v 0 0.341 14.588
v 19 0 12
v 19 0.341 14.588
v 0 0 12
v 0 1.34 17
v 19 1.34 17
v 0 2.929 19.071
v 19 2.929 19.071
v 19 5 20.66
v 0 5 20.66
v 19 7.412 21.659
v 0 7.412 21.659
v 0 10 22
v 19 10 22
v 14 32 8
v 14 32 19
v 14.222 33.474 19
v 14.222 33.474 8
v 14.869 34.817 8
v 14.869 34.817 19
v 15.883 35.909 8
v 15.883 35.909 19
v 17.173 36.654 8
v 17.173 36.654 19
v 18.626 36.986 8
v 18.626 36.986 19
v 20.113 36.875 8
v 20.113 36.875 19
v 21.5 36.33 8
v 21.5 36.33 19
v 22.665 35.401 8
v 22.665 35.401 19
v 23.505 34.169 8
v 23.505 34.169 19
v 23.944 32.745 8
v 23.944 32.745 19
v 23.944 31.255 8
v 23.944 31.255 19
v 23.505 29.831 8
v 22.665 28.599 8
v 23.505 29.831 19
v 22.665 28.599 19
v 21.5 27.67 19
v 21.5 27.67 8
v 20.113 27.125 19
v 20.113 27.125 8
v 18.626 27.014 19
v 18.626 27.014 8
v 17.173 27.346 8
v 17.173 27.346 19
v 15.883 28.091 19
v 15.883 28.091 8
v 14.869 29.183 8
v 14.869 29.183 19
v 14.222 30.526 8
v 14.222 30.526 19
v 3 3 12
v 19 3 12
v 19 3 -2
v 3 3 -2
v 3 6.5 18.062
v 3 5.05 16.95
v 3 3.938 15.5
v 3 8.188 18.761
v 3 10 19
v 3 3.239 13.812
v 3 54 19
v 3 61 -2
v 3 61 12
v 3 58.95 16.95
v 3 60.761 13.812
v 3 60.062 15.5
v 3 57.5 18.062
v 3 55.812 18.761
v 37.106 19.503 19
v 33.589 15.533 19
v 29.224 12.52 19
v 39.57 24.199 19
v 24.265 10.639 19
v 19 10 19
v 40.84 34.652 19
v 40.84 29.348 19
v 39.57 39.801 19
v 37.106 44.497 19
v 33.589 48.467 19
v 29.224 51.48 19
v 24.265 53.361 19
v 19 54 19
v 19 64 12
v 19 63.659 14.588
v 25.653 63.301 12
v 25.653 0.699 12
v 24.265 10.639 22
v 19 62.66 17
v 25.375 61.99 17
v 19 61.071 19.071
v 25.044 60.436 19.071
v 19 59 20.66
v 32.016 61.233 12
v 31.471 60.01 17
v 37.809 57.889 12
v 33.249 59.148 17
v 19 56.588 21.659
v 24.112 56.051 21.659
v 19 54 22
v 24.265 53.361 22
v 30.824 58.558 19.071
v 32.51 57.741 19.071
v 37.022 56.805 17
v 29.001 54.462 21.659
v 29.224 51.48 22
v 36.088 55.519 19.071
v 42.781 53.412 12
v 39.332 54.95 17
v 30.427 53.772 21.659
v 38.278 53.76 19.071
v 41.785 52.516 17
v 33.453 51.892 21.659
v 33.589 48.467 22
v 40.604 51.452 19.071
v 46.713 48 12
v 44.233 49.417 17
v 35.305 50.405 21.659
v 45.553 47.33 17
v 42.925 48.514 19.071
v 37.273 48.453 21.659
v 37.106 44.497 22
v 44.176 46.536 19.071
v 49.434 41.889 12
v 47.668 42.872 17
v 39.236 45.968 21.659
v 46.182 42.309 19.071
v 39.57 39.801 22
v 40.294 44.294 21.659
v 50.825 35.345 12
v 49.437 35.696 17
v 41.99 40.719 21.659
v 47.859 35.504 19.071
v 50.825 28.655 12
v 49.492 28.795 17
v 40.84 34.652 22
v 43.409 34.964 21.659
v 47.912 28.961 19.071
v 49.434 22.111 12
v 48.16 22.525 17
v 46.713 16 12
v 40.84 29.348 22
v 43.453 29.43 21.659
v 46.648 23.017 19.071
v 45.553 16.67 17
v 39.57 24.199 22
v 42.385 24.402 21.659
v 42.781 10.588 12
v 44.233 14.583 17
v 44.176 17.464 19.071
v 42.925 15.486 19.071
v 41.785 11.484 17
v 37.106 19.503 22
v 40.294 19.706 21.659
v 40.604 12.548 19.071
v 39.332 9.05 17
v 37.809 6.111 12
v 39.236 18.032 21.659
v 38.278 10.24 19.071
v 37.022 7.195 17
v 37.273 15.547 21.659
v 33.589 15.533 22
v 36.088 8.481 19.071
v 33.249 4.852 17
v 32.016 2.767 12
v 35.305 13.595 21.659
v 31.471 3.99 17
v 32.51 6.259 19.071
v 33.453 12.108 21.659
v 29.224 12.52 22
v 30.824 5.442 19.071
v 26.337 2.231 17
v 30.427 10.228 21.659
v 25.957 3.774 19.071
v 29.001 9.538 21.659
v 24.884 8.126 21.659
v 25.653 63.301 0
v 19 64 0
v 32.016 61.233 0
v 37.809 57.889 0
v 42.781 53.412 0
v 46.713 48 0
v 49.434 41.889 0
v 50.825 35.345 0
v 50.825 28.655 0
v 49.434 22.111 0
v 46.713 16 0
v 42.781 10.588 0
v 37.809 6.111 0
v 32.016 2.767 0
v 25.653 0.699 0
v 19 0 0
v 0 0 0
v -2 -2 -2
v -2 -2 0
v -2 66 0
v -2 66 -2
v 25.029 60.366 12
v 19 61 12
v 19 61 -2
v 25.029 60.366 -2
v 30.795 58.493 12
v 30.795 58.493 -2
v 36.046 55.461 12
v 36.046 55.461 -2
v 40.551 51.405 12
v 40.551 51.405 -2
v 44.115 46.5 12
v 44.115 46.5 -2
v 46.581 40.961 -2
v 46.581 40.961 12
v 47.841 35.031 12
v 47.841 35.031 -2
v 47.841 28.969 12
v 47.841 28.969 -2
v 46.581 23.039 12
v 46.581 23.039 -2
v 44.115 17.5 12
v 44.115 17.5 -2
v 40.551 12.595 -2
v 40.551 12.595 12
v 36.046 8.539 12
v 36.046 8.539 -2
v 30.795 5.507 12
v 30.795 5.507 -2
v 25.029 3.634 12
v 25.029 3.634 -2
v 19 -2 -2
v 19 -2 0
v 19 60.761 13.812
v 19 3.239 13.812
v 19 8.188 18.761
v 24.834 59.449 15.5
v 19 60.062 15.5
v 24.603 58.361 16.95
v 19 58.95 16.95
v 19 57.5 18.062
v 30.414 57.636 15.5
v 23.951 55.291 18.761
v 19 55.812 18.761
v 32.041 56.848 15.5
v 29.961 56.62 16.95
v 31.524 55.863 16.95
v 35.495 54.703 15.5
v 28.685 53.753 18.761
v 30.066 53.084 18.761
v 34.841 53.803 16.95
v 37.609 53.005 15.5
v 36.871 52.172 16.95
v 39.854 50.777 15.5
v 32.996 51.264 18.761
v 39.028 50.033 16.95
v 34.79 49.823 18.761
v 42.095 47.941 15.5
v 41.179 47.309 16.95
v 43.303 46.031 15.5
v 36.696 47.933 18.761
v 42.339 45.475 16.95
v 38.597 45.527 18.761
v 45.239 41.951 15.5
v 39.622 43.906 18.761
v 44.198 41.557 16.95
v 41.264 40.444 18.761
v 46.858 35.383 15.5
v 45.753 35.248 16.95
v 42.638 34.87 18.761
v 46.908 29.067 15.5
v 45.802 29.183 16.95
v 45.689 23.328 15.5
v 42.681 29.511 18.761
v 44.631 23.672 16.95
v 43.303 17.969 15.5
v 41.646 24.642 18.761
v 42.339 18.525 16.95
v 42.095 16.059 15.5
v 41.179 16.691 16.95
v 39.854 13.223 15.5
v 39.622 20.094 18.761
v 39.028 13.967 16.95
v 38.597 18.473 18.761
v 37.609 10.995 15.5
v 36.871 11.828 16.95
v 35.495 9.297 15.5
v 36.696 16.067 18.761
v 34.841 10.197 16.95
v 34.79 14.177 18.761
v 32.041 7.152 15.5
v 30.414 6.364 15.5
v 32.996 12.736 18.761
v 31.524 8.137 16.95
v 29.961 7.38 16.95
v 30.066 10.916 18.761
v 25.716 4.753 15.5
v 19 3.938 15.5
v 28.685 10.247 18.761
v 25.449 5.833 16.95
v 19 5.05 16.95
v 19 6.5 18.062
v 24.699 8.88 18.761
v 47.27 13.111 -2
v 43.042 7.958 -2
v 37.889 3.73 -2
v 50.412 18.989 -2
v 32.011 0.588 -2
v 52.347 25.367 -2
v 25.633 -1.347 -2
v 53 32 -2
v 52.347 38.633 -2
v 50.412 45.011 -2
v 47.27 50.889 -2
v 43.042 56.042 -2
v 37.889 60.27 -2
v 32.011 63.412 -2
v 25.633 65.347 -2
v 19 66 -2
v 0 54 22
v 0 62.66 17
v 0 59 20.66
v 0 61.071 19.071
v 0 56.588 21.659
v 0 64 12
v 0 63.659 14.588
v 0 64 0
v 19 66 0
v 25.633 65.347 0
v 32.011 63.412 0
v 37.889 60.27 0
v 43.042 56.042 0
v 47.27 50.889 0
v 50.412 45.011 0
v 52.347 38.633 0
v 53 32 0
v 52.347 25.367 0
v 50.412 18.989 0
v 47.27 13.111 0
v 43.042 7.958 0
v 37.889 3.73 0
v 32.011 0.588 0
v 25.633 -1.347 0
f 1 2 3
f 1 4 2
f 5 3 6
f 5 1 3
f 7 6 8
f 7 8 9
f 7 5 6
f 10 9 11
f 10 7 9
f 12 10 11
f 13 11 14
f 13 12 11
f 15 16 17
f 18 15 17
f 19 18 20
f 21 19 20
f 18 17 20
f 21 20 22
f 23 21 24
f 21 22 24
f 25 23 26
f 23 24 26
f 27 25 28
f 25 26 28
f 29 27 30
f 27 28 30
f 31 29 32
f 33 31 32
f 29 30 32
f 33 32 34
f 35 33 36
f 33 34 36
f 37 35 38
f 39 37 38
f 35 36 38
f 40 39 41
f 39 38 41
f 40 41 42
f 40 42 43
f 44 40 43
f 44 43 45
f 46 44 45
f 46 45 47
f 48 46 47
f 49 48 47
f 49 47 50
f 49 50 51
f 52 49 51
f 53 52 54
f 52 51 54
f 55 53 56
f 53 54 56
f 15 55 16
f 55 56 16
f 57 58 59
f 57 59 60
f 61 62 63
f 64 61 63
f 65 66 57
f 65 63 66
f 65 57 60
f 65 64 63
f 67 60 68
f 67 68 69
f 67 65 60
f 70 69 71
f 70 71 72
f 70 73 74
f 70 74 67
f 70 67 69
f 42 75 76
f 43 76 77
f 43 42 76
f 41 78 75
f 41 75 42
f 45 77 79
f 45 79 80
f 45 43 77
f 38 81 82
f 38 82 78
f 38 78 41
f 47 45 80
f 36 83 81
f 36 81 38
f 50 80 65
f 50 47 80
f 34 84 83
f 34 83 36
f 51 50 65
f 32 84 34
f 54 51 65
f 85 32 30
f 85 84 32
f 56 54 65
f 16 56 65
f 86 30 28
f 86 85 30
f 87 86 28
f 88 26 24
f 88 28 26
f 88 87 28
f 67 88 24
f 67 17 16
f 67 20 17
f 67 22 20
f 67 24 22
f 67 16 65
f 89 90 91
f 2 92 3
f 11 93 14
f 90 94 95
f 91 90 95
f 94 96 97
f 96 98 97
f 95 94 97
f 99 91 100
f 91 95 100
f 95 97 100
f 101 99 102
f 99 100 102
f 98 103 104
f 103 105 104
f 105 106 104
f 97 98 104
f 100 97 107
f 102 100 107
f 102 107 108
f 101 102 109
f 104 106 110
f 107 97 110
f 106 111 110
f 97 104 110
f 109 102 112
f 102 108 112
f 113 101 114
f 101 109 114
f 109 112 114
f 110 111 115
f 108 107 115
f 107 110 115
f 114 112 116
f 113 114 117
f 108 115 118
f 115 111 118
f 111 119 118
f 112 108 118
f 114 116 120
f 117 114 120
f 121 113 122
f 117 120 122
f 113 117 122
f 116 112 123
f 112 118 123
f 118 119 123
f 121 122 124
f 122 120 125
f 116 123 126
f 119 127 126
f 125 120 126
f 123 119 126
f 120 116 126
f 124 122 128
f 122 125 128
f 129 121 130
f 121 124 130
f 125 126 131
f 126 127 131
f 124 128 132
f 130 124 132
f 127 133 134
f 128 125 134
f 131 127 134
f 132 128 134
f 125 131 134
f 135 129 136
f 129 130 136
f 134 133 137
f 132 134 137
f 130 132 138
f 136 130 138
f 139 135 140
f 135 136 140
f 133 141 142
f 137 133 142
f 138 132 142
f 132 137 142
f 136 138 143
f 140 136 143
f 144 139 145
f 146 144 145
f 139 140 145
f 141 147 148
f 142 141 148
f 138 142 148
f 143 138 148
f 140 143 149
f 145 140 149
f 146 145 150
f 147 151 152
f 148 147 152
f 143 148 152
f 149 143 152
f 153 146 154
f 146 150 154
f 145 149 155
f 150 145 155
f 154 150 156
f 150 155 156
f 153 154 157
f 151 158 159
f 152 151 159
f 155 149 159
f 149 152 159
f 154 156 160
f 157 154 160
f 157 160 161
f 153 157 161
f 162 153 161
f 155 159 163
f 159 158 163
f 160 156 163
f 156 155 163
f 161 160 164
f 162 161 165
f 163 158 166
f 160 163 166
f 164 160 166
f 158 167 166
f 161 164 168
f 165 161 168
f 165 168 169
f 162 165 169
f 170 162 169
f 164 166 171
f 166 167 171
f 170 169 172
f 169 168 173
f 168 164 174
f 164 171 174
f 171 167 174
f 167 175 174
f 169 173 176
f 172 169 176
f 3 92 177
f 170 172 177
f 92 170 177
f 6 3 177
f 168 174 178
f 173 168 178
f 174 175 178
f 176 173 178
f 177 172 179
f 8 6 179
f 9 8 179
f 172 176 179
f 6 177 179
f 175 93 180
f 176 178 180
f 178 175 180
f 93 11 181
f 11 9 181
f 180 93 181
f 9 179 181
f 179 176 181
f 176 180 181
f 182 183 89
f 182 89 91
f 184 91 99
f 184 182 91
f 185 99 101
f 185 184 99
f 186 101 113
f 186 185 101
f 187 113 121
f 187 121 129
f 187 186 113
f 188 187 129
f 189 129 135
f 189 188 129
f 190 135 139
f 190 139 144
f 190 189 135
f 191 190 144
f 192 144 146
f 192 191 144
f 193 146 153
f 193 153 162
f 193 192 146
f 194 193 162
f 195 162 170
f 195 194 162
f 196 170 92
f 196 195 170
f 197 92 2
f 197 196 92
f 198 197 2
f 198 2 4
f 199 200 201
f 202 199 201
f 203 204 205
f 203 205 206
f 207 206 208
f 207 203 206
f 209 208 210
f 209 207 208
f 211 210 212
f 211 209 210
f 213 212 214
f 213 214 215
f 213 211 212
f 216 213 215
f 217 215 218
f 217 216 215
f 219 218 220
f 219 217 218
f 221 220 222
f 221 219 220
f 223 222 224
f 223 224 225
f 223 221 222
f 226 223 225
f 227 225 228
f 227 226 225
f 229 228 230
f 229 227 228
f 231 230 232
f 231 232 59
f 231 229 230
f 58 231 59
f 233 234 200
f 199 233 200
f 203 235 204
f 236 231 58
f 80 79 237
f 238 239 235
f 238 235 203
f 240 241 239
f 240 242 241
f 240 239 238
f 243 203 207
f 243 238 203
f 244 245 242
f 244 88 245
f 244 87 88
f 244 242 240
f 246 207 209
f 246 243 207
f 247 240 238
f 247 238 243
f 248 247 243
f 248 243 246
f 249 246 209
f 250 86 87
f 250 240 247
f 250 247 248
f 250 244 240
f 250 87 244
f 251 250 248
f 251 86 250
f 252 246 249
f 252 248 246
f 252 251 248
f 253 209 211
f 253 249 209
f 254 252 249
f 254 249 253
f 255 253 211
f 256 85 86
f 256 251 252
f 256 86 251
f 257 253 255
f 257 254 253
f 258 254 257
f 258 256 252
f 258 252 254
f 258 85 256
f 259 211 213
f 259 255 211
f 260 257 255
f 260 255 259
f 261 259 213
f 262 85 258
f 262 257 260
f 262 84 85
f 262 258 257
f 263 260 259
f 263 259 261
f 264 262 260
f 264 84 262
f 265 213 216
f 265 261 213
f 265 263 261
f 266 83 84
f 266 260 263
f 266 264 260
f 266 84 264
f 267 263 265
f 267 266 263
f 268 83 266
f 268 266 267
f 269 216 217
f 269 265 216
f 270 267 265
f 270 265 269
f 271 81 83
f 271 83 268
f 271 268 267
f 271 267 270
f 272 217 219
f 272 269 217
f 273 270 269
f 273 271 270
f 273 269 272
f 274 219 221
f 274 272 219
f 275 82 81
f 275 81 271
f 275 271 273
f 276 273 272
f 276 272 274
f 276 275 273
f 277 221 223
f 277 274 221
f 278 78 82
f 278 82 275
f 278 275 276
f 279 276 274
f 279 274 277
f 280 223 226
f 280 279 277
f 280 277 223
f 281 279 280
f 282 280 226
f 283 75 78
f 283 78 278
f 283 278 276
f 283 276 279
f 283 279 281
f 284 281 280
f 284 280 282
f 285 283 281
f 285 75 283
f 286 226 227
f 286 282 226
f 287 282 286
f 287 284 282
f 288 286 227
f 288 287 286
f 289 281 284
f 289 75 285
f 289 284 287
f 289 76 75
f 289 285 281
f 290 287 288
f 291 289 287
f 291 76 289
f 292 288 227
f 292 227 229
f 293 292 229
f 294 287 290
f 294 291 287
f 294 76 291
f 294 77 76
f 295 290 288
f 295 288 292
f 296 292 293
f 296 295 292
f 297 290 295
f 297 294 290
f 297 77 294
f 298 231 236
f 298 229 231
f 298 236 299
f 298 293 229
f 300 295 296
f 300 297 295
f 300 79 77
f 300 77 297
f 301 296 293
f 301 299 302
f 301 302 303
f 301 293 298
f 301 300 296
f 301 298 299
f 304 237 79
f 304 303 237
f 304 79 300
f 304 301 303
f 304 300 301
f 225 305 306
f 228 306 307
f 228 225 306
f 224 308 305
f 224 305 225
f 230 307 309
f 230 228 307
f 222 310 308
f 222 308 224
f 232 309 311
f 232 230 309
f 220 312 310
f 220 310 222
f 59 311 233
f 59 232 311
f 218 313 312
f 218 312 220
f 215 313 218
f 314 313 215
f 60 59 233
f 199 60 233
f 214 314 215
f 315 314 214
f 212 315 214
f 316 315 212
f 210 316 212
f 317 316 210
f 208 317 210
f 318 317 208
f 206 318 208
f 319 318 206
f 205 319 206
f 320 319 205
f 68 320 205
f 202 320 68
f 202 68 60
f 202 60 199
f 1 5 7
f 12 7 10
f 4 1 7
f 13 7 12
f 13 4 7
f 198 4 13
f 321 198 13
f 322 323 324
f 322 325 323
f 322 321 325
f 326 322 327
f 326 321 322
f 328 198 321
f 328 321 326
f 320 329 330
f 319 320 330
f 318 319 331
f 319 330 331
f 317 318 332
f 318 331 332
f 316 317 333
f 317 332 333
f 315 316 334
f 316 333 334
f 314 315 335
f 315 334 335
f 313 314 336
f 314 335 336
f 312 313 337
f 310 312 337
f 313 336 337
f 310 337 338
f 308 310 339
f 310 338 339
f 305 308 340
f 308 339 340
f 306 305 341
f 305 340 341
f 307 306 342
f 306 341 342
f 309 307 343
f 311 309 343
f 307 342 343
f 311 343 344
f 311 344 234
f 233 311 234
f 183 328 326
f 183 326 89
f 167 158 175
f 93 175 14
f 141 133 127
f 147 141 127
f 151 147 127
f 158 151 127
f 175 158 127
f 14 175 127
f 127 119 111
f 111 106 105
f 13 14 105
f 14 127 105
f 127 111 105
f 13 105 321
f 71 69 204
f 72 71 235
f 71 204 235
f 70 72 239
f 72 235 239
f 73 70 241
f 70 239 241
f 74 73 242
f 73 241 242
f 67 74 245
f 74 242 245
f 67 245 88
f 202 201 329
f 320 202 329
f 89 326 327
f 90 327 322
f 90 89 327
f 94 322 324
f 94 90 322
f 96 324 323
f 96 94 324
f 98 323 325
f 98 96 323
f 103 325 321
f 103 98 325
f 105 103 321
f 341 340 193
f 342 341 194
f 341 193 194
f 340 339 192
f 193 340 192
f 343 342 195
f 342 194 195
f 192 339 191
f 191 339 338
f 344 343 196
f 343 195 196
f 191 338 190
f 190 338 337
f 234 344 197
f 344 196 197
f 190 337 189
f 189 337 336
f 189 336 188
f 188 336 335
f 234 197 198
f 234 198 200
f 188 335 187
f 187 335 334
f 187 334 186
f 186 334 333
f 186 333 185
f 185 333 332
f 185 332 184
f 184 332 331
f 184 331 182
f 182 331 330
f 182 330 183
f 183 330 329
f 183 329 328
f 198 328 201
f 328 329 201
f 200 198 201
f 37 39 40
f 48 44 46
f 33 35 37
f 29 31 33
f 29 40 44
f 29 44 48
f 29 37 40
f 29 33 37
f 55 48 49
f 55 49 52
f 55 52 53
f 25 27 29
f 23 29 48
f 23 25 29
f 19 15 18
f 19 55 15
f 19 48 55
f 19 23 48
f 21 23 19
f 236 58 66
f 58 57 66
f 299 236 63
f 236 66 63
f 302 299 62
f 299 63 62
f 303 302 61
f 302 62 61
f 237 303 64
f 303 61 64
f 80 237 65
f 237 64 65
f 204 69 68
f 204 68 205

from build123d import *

# Parameters (mm, degrees)
BOSS_EXTRUDE3_DEPTH = 22
FILLET2_R           = 10
SHELL1_T            = -3
BOSS_EXTRUDE4_DEPTH = 2
SKETCH4_R           = 5
BOSS_EXTRUDE5_DEPTH = 11


with BuildPart() as part:
    # Sketch2 → Boss-Extrude3 (new body)
    with BuildSketch(Plane.XY):
        with BuildLine():
            Line((0, 0), (0, 64))
            Line((0, 64), (19, 64))
            ThreePointArc((19, 64), (51, 32), (19, 0))
            Line((19, 0), (0, 0))
        make_face()
    extrude(amount=BOSS_EXTRUDE3_DEPTH)

    # Fillet2
    fillet2_edges = [part.edges().sort_by_distance(p)[0] for p in [
        (9.5, 64, 22),
        (9.5, 0, 22),
        (51, 32, 22),
    ]]
    fillet(fillet2_edges, radius=FILLET2_R)

    # Shell1
    shell1_openings = [part.faces().sort_by_distance(p)[0] for p in [
        (17.5, 32, 0),
    ]]
    offset(amount=SHELL1_T, openings=shell1_openings, kind=Kind.INTERSECTION)

    # Sketch3 → Boss-Extrude4 (add)
    with BuildSketch(Plane(origin=(0, 0, 0), x_dir=(-1, 0, 0), z_dir=(0, 0, -1))):
        with BuildLine():
            Line((2, -2), (2, 66))
            Line((2, 66), (-19, 66))
            ThreePointArc((-19, 66), (-53, 32), (-19, -2))
            Line((-19, -2), (2, -2))
        make_face()
        with BuildLine():
            Line((-3, 3), (-3, 61))
            Line((-3, 61), (-19, 61))
            ThreePointArc((-19, 61), (-48, 32), (-19, 3))
            Line((-19, 3), (-3, 3))
        make_face(mode=Mode.SUBTRACT)
    extrude(amount=BOSS_EXTRUDE4_DEPTH)

    # Sketch4 → Boss-Extrude5 (add)
    with BuildSketch(Plane(origin=(0, 0, 19), x_dir=(-1, 0, 0), z_dir=(0, 0, -1))):
        with Locations((-19, 32)):
            Circle(SKETCH4_R)
    extrude(amount=BOSS_EXTRUDE5_DEPTH)


solid = part.part
